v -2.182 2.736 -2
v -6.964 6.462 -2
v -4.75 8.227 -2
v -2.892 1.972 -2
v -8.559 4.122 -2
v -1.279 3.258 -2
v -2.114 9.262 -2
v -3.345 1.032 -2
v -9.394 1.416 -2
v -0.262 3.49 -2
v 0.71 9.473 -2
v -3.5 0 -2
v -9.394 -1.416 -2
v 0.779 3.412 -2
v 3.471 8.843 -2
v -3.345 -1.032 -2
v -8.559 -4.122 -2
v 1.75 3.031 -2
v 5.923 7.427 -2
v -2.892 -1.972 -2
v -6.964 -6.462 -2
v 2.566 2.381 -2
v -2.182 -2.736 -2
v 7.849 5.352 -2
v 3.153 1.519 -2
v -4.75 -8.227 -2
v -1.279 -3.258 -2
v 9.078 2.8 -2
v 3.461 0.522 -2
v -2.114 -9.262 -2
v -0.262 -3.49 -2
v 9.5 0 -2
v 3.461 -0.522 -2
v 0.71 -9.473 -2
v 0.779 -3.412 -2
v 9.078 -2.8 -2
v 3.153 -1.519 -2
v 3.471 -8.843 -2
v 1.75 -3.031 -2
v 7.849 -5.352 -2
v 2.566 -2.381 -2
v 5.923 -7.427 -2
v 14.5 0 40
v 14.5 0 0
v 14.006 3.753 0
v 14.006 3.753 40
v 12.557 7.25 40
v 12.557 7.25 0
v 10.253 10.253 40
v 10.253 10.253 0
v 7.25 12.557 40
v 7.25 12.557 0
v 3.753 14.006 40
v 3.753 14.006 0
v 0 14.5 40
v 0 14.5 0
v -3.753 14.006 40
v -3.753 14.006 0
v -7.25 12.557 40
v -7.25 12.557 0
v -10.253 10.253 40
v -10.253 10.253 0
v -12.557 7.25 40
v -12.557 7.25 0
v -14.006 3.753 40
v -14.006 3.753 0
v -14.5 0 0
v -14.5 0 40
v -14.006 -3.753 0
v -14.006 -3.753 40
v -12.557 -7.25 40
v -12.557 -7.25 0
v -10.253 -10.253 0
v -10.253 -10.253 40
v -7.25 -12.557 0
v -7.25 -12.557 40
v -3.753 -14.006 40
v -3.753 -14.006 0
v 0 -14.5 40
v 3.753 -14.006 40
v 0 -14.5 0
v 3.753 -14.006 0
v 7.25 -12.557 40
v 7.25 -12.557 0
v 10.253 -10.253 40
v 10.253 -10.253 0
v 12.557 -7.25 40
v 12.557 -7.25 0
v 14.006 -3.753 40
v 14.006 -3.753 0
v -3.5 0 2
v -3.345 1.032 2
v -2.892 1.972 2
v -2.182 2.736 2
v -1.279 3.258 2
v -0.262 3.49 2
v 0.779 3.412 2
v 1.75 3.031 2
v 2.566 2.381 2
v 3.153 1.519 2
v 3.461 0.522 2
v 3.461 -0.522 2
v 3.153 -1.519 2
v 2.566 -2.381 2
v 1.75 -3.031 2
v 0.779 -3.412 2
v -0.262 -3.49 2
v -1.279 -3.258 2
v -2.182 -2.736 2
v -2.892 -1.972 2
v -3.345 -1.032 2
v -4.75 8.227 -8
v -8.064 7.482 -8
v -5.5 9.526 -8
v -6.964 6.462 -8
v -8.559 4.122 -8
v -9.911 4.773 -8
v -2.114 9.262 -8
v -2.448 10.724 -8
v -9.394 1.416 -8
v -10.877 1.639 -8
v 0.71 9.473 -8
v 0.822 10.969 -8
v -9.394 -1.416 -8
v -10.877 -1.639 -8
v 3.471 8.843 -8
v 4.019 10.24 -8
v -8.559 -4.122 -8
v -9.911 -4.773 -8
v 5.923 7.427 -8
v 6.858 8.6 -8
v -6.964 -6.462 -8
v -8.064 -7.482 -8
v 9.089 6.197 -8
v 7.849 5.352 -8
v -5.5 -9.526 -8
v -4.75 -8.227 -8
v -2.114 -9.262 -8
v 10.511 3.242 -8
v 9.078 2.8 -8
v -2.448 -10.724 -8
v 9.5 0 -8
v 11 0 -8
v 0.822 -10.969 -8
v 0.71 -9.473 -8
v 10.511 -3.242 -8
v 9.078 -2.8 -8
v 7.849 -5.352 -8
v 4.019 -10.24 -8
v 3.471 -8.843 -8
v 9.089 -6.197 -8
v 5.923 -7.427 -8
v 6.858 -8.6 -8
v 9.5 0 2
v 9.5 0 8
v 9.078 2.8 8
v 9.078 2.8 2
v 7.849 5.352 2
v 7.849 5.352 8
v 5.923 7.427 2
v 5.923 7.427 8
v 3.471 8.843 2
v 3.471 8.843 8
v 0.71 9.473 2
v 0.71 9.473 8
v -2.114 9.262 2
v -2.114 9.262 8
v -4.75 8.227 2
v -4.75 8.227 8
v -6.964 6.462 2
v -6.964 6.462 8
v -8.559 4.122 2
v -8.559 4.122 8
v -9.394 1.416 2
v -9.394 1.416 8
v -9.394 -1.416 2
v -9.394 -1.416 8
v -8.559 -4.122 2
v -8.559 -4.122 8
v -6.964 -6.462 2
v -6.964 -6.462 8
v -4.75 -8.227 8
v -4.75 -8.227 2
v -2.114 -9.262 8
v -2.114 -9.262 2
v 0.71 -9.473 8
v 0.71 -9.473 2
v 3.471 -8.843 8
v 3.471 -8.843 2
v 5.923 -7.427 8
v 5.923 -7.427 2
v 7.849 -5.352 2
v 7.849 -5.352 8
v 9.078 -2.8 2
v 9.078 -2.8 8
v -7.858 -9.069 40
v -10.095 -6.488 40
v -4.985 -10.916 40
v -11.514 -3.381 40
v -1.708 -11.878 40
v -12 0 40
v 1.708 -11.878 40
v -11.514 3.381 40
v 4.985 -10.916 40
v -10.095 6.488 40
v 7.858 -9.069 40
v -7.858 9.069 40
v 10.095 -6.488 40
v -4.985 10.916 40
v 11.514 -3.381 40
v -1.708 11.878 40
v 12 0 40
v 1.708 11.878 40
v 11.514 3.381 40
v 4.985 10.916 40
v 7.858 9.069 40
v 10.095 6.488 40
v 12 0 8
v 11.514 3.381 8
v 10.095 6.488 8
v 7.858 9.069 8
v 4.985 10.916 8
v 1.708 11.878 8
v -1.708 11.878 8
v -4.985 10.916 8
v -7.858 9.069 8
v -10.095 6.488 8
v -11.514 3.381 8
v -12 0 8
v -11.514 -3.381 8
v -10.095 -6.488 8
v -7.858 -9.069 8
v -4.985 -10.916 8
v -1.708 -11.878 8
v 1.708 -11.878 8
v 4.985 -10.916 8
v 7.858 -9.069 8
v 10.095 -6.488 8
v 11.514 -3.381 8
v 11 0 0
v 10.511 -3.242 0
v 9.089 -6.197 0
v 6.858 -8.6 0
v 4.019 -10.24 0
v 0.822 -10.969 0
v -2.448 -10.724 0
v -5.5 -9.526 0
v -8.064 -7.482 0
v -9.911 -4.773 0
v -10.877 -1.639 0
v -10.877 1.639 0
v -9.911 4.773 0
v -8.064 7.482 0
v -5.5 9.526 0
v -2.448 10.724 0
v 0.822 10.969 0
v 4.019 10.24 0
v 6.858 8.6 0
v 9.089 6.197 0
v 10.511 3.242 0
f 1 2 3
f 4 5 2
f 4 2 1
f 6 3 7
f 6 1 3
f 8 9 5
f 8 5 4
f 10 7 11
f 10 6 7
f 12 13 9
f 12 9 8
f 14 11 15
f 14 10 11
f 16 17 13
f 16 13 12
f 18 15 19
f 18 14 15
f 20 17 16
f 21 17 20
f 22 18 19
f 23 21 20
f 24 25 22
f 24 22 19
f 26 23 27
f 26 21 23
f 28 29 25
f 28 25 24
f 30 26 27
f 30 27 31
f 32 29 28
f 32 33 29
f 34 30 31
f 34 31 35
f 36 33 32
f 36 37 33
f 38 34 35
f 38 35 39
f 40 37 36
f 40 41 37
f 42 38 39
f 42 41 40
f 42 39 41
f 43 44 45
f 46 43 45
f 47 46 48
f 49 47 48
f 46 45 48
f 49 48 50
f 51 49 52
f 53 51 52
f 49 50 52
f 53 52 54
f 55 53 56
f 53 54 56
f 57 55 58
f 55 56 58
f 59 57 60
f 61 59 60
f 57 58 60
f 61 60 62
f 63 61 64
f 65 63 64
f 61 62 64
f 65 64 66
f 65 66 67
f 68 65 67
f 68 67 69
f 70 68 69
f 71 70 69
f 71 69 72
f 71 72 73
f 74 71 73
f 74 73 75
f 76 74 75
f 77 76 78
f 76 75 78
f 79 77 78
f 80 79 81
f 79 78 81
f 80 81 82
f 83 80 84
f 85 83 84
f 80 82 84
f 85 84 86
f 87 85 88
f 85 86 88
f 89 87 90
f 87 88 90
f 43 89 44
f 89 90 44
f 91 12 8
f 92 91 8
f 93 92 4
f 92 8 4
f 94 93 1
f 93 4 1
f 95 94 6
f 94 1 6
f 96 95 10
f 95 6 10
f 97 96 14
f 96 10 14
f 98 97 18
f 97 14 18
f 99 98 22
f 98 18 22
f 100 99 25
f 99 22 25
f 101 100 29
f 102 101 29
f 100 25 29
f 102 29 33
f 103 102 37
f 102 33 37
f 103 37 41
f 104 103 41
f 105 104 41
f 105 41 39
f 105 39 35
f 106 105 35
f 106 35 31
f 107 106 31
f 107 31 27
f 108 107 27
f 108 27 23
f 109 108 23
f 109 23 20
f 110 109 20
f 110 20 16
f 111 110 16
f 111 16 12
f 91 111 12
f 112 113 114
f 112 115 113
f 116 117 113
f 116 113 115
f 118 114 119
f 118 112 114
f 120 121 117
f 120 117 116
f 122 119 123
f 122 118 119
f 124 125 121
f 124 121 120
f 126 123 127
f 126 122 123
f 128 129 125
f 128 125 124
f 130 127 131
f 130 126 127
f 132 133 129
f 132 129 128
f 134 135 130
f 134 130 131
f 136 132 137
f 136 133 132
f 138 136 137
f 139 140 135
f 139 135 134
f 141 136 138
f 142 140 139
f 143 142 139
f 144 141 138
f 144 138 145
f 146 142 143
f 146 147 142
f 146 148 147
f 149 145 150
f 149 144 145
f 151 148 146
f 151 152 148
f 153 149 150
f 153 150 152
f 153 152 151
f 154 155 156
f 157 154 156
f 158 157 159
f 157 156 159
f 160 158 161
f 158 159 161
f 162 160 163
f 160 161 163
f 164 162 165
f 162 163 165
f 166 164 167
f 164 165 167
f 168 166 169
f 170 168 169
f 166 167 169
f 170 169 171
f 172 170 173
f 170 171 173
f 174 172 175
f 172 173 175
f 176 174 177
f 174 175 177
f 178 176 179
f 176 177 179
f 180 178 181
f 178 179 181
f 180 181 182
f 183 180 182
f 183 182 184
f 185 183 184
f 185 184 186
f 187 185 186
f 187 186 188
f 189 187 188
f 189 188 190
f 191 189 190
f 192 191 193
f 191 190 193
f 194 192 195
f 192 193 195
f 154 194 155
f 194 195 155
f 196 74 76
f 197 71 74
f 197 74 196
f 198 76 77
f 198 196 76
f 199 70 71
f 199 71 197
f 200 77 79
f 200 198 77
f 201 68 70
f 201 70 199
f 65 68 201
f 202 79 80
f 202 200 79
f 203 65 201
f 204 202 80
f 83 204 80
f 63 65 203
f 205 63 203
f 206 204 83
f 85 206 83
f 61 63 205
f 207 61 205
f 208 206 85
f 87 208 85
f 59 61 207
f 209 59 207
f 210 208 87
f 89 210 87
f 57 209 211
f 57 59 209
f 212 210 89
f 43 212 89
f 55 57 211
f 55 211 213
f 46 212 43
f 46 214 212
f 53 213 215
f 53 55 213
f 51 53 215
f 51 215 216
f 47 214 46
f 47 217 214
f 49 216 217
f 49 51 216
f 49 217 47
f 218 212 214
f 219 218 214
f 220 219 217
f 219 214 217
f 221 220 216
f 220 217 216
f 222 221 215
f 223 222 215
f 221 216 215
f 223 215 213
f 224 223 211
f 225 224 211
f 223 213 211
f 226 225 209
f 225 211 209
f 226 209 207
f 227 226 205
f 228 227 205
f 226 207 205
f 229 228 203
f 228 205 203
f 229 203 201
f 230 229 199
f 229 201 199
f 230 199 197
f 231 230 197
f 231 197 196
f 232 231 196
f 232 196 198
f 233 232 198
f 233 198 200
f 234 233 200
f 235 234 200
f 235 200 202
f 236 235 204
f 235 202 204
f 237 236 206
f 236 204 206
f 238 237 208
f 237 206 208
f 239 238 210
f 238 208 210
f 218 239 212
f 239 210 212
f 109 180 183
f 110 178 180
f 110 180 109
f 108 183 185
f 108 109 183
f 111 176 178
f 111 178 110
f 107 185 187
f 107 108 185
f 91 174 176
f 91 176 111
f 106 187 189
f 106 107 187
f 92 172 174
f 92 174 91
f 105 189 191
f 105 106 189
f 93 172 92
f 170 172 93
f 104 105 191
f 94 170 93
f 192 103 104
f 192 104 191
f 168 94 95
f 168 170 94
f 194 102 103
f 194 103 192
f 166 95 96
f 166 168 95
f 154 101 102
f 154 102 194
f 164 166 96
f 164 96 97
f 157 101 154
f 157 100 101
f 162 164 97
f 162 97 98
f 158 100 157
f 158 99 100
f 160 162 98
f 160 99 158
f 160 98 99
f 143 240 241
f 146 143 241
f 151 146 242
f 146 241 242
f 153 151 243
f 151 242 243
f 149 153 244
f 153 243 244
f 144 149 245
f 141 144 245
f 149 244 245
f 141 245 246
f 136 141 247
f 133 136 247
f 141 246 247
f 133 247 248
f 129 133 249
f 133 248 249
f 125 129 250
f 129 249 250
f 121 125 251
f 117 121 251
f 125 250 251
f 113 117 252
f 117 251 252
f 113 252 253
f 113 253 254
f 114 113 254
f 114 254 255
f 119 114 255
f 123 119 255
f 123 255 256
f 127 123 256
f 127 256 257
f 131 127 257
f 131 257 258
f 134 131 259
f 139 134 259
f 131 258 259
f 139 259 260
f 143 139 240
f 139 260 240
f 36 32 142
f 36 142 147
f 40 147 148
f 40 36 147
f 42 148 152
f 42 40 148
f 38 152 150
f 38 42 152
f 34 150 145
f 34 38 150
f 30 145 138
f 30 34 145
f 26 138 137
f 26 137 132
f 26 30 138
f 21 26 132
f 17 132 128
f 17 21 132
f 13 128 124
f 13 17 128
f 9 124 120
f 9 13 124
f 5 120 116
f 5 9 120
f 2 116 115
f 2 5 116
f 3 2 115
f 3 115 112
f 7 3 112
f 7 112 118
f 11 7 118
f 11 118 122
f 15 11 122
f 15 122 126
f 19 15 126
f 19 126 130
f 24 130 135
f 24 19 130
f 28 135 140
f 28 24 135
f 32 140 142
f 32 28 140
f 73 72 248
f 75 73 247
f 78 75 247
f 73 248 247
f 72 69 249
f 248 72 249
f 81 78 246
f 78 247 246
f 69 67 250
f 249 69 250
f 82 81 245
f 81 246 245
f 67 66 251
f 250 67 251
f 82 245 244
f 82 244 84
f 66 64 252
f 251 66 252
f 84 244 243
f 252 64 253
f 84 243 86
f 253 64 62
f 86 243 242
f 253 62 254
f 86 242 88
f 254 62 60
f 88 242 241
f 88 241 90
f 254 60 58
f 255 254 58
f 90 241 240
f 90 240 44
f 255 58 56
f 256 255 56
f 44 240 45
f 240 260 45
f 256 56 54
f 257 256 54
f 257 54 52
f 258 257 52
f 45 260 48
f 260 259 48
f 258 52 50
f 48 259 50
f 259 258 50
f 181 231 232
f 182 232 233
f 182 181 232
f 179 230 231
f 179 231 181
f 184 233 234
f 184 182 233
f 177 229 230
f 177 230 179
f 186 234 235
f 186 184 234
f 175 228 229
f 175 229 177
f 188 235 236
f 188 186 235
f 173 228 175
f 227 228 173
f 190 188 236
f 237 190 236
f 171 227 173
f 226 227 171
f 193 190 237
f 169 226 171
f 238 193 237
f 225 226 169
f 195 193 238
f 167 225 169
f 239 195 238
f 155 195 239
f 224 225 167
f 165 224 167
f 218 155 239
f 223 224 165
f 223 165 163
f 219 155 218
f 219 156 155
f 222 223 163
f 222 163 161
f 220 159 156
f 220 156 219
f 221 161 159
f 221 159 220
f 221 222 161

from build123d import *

# Parameters (mm, degrees)
SKETCH_1_R          = 14.5
EXTRUDE_1_DEPTH     = 40
SKETCH_2_R          = 12
CUT_EXTRUDE_1_DEPTH = 32
SKETCH_3_R          = 11
EXTRUDE_2_DEPTH     = 8
SKETCH_4_R          = 9.5
CUT_EXTRUDE_2_DEPTH = 6
CUT_EXTRUDE_START   = -6
SKETCH_5_R          = 9.5
CUT_EXTRUDE_3_DEPTH = 6
SKETCH_6_R          = 3.5
CUT_EXTRUDE_4_DEPTH = 6


with BuildPart() as part:
    # 스케치1 → 돌출1 (new body)
    with BuildSketch(Plane.XY):
        Circle(SKETCH_1_R)
    extrude(amount=EXTRUDE_1_DEPTH)

    # 스케치2 → 컷-돌출1 (cut)
    with BuildSketch(Plane.XY.offset(40)):
        Circle(SKETCH_2_R)
    extrude(amount=-CUT_EXTRUDE_1_DEPTH, mode=Mode.SUBTRACT)

    # 스케치3 → 돌출2 (add)
    with BuildSketch(Plane(origin=(0, 0, 0), x_dir=(-1, 0, 0), z_dir=(0, 0, -1))):
        with Locations(Location((0, 0, 0), (0, 0, 180))):
            Circle(SKETCH_3_R)
    extrude(amount=EXTRUDE_2_DEPTH)

    # 스케치4 → 컷-돌출2 (cut)
    with BuildSketch(Plane.XY.offset(8)):
        Circle(SKETCH_4_R)
    extrude(amount=-CUT_EXTRUDE_2_DEPTH, mode=Mode.SUBTRACT)

    # 스케치5 → 컷-돌출3 (cut)
    with BuildSketch(Plane(origin=(0, 0, -8), x_dir=(-1, 0, 0), z_dir=(0, 0, -1)).offset(CUT_EXTRUDE_START)):
        with Locations(Location((0, 0, 0), (0, 0, 180))):
            Circle(SKETCH_5_R)
    extrude(amount=CUT_EXTRUDE_3_DEPTH, mode=Mode.SUBTRACT)

    # 스케치6 → 컷-돌출4 (cut)
    with BuildSketch(Plane(origin=(0, 0, -2), x_dir=(-1, 0, 0), z_dir=(0, 0, -1))):
        Circle(SKETCH_6_R)
    extrude(amount=-CUT_EXTRUDE_4_DEPTH, mode=Mode.SUBTRACT)


solid = part.part
